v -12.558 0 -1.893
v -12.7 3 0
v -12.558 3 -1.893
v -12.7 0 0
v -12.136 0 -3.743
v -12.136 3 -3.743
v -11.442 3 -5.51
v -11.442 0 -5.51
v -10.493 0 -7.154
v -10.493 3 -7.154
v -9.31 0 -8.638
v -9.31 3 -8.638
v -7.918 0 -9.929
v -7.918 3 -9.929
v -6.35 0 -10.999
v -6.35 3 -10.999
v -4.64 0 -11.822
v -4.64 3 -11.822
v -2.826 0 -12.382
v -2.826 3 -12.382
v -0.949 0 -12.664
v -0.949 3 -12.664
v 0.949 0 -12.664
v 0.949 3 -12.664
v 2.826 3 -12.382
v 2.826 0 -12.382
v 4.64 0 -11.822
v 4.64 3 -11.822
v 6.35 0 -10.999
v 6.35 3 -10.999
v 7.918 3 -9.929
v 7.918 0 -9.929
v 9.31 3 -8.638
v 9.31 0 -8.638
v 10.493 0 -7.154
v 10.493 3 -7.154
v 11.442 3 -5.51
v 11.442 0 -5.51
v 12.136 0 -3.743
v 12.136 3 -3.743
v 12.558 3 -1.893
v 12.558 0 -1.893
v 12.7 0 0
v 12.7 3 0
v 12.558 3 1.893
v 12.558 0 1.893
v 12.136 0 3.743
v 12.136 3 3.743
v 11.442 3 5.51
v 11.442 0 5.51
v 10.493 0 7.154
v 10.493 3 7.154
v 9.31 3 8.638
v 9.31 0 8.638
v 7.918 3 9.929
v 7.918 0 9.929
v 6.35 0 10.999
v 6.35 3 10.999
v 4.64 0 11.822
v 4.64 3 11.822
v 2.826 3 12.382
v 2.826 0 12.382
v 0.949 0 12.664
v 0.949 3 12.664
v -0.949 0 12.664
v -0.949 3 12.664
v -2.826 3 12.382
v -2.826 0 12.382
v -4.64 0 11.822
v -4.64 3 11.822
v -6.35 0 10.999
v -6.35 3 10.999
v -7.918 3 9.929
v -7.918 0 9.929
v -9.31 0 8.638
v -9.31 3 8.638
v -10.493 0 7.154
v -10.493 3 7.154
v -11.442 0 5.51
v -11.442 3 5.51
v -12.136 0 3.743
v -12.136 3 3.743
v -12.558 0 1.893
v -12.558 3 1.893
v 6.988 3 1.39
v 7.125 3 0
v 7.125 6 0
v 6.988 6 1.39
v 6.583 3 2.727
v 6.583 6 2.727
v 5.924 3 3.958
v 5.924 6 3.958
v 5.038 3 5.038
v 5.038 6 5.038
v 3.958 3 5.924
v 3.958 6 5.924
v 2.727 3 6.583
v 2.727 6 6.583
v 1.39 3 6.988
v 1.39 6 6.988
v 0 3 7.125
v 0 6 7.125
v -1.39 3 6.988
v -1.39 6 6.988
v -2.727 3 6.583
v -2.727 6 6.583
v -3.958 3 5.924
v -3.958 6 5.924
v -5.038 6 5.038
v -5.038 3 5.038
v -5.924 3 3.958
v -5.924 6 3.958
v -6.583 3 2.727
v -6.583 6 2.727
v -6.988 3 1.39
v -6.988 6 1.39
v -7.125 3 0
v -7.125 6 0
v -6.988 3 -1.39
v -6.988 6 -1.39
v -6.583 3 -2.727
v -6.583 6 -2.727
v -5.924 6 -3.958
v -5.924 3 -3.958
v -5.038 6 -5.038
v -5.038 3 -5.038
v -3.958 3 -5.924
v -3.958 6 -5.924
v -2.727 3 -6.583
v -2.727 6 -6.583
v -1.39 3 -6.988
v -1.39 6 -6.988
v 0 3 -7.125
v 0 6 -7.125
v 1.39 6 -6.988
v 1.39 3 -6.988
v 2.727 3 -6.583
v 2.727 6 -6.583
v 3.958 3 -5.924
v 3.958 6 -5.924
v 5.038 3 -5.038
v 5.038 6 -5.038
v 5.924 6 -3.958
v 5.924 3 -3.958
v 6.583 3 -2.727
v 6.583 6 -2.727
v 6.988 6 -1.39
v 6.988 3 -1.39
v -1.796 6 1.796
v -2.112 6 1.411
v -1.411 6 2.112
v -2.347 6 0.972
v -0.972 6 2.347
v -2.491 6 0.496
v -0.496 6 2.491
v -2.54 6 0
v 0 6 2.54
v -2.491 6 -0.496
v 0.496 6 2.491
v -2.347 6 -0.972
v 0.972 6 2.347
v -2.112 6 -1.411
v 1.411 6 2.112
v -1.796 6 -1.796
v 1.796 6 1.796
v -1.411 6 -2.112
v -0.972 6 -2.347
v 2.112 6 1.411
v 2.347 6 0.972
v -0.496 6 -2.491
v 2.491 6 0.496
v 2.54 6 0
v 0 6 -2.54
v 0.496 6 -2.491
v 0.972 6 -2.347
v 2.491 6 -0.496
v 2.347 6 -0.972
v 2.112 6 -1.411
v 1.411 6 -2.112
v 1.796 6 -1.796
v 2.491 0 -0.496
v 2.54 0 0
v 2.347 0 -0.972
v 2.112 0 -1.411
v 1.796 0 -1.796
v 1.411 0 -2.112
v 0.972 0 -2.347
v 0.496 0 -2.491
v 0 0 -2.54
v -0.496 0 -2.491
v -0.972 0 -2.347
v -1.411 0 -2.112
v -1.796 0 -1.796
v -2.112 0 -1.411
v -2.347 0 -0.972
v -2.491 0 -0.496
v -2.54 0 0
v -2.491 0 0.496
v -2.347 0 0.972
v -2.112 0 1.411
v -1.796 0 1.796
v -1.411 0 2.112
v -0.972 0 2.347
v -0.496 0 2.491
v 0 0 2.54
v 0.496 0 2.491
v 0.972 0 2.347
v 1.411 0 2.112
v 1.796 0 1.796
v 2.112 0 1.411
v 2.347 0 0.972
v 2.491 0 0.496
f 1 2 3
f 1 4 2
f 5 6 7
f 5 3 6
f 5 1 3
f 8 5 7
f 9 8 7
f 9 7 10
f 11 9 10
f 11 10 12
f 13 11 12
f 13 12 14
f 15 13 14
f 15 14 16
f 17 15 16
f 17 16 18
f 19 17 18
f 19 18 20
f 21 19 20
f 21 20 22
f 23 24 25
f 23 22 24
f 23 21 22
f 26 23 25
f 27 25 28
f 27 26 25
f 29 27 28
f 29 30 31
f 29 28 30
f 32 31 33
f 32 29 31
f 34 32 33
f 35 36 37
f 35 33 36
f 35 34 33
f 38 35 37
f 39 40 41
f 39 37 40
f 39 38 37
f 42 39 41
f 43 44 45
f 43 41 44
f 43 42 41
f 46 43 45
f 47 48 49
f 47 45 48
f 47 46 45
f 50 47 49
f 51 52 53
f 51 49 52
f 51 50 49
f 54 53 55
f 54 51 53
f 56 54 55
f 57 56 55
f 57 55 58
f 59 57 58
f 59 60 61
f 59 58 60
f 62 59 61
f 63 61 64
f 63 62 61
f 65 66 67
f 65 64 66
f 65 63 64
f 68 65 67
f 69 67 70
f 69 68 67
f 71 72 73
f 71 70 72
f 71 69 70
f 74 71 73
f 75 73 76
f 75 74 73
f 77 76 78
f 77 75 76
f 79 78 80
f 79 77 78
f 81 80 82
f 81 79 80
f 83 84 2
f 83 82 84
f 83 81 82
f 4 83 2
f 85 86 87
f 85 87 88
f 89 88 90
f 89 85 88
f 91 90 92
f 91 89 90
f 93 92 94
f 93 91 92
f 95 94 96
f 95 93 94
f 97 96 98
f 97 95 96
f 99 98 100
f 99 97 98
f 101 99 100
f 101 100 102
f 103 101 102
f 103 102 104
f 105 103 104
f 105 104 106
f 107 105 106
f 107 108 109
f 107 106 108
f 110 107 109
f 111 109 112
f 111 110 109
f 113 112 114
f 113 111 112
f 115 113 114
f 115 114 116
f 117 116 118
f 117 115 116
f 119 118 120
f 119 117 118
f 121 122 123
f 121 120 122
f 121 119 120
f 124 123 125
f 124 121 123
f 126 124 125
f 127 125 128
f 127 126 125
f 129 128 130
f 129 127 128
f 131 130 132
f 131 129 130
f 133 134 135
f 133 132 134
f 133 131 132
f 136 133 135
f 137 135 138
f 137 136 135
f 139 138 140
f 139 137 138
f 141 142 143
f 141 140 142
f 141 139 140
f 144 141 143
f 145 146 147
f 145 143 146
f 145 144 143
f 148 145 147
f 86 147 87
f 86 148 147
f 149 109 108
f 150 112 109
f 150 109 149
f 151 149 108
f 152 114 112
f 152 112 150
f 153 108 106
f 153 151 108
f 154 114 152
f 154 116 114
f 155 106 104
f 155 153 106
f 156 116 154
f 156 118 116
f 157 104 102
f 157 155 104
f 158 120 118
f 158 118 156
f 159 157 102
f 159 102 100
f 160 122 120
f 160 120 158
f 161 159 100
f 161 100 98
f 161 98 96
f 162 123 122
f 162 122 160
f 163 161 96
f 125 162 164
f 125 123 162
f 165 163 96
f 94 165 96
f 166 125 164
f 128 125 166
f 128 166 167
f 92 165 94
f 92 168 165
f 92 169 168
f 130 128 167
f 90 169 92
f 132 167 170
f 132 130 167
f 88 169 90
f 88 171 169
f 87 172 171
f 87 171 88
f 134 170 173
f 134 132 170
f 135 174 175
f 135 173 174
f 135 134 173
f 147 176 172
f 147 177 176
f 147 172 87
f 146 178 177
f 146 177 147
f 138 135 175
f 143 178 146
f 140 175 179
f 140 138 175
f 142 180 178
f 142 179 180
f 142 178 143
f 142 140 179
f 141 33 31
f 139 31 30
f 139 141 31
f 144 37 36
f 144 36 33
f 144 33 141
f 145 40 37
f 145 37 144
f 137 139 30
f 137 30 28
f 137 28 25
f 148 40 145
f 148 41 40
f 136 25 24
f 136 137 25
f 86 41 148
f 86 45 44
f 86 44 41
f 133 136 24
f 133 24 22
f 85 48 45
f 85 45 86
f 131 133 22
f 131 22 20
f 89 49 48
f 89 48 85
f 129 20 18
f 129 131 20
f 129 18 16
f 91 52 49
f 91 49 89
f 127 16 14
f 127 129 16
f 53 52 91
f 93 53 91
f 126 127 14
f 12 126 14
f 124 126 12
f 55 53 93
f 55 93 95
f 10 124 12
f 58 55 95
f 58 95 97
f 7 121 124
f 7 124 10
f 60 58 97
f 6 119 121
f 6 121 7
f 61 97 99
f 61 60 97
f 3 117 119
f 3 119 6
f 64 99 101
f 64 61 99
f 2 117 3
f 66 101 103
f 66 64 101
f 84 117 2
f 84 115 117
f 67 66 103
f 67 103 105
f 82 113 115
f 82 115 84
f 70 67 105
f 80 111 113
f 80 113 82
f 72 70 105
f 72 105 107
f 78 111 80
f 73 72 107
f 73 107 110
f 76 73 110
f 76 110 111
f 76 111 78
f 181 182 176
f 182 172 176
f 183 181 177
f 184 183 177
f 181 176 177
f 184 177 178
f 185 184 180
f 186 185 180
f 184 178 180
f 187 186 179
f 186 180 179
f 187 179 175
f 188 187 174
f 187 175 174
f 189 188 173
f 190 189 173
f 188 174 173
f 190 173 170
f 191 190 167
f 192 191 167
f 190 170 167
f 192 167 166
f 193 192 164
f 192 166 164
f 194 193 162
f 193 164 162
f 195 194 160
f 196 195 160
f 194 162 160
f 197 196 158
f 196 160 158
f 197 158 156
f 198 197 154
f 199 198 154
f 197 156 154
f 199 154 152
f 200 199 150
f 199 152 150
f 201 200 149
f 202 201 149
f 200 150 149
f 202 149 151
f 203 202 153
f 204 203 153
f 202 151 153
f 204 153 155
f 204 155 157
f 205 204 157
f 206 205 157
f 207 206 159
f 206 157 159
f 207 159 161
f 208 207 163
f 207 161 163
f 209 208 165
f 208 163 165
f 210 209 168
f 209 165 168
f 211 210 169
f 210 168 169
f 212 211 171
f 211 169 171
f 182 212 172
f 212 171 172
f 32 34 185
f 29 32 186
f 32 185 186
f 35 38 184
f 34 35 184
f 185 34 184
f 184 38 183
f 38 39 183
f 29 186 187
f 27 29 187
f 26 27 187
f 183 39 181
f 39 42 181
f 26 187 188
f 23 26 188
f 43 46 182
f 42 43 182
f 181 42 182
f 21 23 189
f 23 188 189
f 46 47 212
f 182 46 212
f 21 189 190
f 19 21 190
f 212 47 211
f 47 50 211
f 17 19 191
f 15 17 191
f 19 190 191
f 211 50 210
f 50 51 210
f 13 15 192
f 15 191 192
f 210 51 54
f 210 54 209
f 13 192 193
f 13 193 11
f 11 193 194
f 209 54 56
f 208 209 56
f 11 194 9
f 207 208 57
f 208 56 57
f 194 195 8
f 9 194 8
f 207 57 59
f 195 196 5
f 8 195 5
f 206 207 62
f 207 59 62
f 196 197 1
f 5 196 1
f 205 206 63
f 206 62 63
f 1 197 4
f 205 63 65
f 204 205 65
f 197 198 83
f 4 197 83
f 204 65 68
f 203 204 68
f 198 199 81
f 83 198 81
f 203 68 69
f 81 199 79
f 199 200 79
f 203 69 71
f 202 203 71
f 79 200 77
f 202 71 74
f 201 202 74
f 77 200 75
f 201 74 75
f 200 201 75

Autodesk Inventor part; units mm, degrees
ref_plane "YZ Plane" through (0, 0, 0) normal (1, 0, 0) x (0, 1, 0)
ref_plane "XZ Plane" through (0, 0, 0) normal (0, 1, 0) x (-1, 0, 0)
ref_plane "XY Plane" through (0, 0, 0) normal (0, 0, 1) x (1, 0, 0)
sketch "Sketch1" plane through (0, 0, 0) normal (0, 1, 0) x (-1, 0, 0)
  circle A0 centre (0, 0) radius 12.7
  dimension "d0" = 25.4
extrude "Extrusion1" add sketch "Sketch1" along normal blind 3
sketch "Sketch2" plane through (0, 3, 0) normal (0, 1, 0) x (1, 0, 0)
  circle A0 centre (0, 0) radius 7.125
  dimension "d3" = 14.25
extrude "Extrusion2" add sketch "Sketch2" along normal blind 3
sketch "Sketch3" plane through (0, 6, 0) normal (0, 1, 0) x (1, 0, 0)
  circle A0 centre (0, 0) radius 2.54
  dimension "d6" = 5.08
extrude "Extrusion3" cut sketch "Sketch3" against normal up to next
properties part number "PhotonCerberCageInsert"
